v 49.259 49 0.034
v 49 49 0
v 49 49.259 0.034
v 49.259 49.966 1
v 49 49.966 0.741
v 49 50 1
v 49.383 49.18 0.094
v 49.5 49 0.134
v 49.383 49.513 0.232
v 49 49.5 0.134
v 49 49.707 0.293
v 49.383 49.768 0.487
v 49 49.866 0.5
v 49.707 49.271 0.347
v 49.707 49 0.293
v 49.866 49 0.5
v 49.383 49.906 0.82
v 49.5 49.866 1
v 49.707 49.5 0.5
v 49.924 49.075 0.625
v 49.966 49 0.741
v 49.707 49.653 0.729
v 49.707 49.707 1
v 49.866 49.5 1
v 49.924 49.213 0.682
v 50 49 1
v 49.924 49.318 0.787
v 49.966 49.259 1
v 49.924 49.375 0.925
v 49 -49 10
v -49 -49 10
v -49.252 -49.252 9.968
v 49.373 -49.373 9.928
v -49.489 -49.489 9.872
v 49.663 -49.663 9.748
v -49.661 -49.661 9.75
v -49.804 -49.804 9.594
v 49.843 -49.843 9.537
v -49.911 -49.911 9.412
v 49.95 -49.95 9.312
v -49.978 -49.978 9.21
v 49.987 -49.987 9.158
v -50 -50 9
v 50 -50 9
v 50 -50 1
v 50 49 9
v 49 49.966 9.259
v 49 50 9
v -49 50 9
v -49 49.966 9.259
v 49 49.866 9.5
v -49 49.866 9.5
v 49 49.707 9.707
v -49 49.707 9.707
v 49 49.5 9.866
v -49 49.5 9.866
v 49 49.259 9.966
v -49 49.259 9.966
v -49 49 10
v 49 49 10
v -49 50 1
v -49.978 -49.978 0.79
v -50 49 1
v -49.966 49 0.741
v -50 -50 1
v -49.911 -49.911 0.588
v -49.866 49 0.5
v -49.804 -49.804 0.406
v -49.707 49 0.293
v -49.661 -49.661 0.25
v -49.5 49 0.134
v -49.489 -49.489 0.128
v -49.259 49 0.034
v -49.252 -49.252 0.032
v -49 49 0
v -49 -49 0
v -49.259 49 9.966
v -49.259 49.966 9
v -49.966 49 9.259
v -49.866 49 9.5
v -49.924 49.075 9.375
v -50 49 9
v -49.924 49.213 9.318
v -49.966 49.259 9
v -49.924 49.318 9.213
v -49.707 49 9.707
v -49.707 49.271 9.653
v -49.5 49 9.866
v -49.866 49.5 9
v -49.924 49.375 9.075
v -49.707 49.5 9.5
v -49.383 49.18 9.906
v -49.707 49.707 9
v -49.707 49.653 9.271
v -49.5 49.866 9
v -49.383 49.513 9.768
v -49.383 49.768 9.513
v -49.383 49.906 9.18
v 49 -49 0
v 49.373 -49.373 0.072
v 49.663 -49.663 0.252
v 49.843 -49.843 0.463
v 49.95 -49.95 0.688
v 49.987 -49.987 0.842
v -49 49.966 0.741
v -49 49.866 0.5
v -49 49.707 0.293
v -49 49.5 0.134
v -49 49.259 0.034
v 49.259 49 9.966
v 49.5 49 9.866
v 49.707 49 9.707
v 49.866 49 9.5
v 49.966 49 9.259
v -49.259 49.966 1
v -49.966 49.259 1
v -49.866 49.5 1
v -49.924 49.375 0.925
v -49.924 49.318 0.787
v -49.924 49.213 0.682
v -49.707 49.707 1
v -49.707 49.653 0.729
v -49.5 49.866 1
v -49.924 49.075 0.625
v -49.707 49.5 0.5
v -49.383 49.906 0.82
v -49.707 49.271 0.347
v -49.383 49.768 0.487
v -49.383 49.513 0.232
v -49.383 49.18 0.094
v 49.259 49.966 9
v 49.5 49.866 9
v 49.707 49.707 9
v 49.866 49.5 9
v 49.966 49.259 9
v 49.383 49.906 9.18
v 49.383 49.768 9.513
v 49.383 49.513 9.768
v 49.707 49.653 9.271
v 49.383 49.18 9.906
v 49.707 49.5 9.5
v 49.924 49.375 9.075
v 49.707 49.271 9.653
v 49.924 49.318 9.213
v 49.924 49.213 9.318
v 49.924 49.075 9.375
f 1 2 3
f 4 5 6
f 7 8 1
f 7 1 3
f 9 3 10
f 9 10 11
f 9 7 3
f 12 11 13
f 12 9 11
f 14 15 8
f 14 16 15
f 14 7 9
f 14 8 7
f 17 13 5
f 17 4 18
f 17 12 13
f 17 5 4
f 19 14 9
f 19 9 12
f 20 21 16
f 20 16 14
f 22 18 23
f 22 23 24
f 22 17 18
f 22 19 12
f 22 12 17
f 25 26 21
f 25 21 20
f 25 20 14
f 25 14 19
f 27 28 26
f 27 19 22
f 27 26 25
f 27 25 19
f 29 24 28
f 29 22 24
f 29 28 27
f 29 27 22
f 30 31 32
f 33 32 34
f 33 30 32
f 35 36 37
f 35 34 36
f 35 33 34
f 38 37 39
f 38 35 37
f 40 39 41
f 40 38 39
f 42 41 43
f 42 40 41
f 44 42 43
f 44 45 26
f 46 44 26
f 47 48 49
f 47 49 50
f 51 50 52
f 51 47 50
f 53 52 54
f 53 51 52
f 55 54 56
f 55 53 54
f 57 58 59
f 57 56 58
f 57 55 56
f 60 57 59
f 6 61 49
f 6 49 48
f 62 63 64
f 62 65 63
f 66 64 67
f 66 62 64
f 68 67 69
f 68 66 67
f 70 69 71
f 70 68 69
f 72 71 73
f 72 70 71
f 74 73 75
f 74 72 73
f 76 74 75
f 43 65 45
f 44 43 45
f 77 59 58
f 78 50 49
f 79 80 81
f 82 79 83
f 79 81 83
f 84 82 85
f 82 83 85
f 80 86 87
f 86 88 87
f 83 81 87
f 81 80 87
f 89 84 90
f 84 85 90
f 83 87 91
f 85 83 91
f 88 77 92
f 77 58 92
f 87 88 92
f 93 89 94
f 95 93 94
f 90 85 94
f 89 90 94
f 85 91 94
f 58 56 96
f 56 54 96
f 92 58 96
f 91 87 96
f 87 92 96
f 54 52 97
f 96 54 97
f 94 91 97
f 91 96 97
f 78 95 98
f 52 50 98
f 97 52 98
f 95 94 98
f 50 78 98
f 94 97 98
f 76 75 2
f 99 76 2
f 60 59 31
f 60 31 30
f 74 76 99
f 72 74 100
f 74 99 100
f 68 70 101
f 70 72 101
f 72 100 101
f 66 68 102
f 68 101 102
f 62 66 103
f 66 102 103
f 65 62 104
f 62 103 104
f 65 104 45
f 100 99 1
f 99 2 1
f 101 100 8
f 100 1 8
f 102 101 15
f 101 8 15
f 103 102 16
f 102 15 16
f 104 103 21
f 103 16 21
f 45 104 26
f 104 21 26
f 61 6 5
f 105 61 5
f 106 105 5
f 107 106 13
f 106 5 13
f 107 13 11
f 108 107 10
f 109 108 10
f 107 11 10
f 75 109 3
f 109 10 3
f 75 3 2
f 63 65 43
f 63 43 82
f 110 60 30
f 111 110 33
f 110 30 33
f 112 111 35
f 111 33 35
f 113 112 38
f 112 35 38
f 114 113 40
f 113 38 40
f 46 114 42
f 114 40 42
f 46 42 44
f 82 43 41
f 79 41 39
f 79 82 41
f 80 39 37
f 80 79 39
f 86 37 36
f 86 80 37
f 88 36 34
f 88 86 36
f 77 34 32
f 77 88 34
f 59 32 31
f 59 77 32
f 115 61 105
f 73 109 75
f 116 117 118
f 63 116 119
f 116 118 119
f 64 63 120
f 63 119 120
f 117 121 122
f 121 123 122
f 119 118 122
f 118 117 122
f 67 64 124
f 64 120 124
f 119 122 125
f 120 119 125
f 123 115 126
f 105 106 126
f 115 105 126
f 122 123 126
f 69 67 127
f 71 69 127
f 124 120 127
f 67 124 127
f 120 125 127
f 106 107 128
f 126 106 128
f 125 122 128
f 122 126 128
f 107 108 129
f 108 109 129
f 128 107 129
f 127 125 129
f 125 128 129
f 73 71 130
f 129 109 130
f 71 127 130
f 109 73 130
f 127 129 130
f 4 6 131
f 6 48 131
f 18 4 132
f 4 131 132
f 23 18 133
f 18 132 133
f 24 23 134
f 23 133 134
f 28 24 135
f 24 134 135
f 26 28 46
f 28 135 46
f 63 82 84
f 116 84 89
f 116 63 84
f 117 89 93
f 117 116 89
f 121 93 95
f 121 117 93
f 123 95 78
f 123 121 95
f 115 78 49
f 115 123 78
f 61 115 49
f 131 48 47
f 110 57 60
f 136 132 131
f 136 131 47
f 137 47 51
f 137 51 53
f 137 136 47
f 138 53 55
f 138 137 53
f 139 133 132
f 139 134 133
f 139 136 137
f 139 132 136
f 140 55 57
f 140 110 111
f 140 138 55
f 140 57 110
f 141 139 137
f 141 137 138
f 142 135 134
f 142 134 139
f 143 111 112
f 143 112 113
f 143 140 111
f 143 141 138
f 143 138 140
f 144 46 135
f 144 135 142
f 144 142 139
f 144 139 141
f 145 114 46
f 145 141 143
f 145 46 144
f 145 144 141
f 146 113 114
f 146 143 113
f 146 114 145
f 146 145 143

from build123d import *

# Parameters (mm, degrees)
SKETCH1_W           = 100
SKETCH1_H           = 100
BOSS_EXTRUDE1_DEPTH = 10
FILLET2_R           = 1
FILLET3_R           = 1
FILLET5_R           = 1


with BuildPart() as part:
    # Sketch1 → Boss-Extrude1 (new body)
    with BuildSketch(Plane.XY):
        Rectangle(SKETCH1_W, SKETCH1_H)
    extrude(amount=BOSS_EXTRUDE1_DEPTH)

    # Fillet2
    fillet2_edges = [part.edges().sort_by_distance(p)[0] for p in [
        (0, 50, 10),
    ]]
    fillet(fillet2_edges, radius=FILLET2_R)

    # Fillet3
    fillet3_edges = [part.edges().sort_by_distance(p)[0] for p in [
        (0, 50, 0),
    ]]
    fillet(fillet3_edges, radius=FILLET3_R)

    # Fillet5
    fillet5_edges = [part.edges().sort_by_distance(p)[0] for p in [
        (-50, -0.5, 10),
        (-50, 50, 5),
        (-50, 49.707106781, 9.707106781),
        (50, 50, 5),
        (50, 49.707106781, 9.707106781),
        (0, -50, 10),
        (-50, -0.5, 0),
        (-50, 49.707106781, 0.292893219),
        (50, 49.707106781, 0.292893219),
        (50, -0.5, 10),
        (0, -50, 0),
        (50, -0.5, 0),
    ]]
    fillet(fillet5_edges, radius=FILLET5_R)


solid = part.part
